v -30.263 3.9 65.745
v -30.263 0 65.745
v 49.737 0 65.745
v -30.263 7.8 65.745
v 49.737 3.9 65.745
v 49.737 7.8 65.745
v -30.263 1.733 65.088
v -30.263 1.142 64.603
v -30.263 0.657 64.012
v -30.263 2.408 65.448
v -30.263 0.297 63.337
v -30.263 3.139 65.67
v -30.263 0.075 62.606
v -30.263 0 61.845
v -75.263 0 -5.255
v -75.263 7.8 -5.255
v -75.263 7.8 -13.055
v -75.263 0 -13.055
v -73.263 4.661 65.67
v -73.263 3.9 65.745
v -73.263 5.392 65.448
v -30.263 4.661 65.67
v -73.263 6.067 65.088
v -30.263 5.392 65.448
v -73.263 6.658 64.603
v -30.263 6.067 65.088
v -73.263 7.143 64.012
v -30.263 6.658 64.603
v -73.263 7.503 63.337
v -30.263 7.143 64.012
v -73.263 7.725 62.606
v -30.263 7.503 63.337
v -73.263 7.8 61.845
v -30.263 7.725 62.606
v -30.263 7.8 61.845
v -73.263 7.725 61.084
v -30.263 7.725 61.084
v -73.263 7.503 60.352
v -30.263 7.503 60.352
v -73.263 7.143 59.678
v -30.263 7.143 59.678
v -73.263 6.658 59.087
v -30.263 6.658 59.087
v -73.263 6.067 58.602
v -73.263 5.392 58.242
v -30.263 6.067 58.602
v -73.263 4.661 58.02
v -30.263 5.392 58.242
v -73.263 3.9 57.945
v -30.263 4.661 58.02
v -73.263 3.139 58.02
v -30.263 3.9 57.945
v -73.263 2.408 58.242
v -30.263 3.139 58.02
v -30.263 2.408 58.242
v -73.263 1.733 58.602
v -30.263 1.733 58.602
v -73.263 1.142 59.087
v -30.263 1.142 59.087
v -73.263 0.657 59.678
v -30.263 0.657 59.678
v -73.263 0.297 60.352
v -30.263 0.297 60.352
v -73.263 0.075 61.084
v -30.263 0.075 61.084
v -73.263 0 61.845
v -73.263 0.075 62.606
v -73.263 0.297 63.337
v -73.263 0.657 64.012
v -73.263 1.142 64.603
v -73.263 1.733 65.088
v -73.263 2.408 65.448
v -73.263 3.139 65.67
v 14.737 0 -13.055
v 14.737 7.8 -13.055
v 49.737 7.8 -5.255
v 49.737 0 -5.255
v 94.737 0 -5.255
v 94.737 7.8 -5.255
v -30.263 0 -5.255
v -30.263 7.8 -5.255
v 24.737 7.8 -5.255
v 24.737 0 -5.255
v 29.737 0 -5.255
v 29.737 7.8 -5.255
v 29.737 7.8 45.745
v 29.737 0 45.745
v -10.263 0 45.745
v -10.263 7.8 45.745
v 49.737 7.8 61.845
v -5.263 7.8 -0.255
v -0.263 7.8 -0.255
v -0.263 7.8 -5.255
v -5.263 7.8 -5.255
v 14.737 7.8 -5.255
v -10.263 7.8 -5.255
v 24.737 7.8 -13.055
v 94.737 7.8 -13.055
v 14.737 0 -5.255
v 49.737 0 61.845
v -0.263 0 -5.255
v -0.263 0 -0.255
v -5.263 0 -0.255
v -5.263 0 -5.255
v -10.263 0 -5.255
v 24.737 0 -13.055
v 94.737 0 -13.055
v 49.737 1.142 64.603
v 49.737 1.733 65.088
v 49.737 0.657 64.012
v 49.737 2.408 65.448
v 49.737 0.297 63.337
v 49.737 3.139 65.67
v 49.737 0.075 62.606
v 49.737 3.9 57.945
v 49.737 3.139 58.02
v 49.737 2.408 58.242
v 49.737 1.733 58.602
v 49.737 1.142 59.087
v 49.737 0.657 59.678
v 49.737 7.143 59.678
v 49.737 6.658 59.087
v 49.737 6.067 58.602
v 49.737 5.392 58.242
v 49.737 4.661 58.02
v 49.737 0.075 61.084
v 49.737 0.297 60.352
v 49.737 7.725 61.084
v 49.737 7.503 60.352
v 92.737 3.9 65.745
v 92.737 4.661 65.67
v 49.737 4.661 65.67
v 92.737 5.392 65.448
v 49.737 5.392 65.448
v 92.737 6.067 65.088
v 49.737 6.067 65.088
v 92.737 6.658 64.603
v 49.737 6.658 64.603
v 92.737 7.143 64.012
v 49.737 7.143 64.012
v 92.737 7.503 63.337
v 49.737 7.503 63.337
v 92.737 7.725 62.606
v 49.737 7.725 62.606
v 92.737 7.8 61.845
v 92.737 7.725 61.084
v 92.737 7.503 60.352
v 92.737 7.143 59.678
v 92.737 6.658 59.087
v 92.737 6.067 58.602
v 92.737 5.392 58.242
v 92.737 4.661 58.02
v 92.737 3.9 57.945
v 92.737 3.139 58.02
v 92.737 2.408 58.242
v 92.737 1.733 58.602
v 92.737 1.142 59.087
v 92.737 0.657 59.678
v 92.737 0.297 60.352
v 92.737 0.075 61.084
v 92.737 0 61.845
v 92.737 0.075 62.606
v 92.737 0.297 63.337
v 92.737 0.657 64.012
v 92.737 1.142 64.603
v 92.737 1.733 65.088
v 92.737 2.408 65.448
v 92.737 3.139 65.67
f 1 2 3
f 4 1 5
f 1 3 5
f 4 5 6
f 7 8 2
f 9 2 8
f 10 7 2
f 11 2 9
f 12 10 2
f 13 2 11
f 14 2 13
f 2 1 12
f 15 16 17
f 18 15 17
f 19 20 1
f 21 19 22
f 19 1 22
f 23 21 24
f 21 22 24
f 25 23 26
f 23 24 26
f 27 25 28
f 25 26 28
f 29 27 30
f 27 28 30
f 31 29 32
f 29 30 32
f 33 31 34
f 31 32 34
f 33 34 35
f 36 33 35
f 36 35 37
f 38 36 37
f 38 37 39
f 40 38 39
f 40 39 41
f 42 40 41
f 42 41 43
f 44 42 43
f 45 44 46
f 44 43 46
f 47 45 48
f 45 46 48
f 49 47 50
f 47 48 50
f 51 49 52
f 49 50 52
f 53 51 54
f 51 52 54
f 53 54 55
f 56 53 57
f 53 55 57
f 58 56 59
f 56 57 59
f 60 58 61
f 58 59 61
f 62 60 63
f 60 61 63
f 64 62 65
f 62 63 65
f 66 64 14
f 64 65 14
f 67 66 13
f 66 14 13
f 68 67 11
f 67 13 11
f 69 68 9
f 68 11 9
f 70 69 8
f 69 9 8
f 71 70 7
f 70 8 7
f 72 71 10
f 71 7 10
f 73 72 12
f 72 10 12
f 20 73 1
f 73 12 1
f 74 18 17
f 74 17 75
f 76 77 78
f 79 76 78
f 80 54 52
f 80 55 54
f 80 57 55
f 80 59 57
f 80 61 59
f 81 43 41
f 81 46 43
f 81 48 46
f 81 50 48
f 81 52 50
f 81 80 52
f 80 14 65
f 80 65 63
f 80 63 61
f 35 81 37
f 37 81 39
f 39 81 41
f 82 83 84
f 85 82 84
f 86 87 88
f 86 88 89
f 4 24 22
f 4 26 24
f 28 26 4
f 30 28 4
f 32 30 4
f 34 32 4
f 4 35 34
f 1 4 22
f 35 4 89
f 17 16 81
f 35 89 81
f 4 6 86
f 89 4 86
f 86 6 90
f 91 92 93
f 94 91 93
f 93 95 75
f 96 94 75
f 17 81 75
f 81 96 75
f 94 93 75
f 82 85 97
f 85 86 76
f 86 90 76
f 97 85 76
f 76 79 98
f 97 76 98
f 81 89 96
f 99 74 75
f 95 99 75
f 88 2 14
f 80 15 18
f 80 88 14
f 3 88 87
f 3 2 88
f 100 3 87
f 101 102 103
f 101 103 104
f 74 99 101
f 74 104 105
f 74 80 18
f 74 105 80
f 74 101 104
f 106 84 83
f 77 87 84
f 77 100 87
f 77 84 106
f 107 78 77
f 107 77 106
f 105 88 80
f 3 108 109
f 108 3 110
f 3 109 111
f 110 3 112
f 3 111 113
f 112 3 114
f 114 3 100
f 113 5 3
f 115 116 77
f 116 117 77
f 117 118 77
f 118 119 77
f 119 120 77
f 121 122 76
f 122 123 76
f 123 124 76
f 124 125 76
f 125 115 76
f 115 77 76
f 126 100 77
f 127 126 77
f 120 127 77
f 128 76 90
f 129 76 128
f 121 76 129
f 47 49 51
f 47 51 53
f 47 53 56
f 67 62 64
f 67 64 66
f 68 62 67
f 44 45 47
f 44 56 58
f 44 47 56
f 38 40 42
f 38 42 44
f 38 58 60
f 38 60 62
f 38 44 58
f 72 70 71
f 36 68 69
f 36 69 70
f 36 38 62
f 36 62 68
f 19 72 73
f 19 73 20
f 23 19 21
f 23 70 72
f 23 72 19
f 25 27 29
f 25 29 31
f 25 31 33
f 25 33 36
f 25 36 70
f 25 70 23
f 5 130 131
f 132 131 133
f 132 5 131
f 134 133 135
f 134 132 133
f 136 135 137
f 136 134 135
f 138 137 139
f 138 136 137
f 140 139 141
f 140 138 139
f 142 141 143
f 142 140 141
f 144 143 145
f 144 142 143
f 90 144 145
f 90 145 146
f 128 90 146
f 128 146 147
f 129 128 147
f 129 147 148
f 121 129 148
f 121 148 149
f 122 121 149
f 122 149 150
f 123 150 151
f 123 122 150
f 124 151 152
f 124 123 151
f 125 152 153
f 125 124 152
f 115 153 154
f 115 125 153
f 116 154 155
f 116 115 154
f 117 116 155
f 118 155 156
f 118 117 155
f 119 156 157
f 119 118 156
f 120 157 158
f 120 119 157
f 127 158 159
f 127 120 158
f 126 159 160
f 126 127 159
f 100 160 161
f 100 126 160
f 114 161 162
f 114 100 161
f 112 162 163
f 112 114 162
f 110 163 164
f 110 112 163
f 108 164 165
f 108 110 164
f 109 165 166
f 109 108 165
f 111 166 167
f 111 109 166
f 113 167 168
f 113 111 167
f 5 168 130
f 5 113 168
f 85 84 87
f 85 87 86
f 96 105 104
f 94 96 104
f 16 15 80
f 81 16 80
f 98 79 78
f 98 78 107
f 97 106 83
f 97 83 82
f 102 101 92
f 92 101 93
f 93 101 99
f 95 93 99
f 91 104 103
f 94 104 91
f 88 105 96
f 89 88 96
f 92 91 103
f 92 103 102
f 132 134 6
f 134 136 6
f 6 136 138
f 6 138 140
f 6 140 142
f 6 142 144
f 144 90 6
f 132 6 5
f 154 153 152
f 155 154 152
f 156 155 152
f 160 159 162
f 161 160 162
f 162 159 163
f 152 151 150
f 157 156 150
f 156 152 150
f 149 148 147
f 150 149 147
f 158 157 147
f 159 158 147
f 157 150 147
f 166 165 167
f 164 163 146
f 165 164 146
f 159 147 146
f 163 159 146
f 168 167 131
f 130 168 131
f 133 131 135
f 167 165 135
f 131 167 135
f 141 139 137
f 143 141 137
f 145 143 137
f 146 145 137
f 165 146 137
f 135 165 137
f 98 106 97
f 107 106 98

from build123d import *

# Parameters (mm, degrees)
SKETCH1_W           = 170
SKETCH1_H           = 7.8
BOSS_EXTRUDE1_DEPTH = 7.8
SKETCH2_W           = 20
SKETCH2_H           = 7.8
BOSS_EXTRUDE2_DEPTH = 71
SKETCH3_R           = 3.9
BOSS_EXTRUDE3_DEPTH = 43
SKETCH4_W           = 20
SKETCH4_H           = 7.8
BOSS_EXTRUDE4_DEPTH = 25
SKETCH5_W           = 10
SKETCH5_H           = 7.8
CUT_EXTRUDE1_DEPTH  = 119.646151442
SKETCH6_W           = 5
SKETCH6_H           = 7.8
BOSS_EXTRUDE5_DEPTH = 5


with BuildPart() as part:
    # Sketch1 → Boss-Extrude1 (new body)
    with BuildSketch(Plane(origin=(0, 0, 0), x_dir=(1, 0, 0), z_dir=(0, 1, 0))):
        with Locations((9.736842105, 9.155198973)):
            Rectangle(SKETCH1_W, SKETCH1_H)
    extrude(amount=BOSS_EXTRUDE1_DEPTH)

    # Sketch2 → Boss-Extrude2 (add)
    with BuildSketch(Plane.XY.offset(-5.255198973)):
        with Locations((-20.263157895, 3.9)):
            Rectangle(SKETCH2_W, SKETCH2_H)
    boss_extrude2 = extrude(amount=BOSS_EXTRUDE2_DEPTH)

    # Sketch3 → Boss-Extrude3 (add)
    with BuildSketch(Plane.ZY.offset(30.263157895)):
        with Locations((61.844801027, 3.9)):
            Circle(SKETCH3_R)
    boss_extrude3 = extrude(amount=BOSS_EXTRUDE3_DEPTH)

    # Sketch4 → Boss-Extrude4 (add)
    with BuildSketch(Plane(origin=(-10.263157895, 0, 0), x_dir=(0, 0, -1), z_dir=(1, 0, 0))):
        with Locations((-55.744801027, 3.9)):
            Rectangle(SKETCH4_W, SKETCH4_H)
    boss_extrude4 = extrude(amount=BOSS_EXTRUDE4_DEPTH)

    # Mirror1: Boss-Extrude2, Boss-Extrude3, Boss-Extrude4 across plane
    add(boss_extrude2.mirror(Plane.ZY.offset(-9.736842105)))
    add(boss_extrude3.mirror(Plane.ZY.offset(-9.736842105)))
    add(boss_extrude4.mirror(Plane.ZY.offset(-9.736842105)))

    # Sketch5 → Cut-Extrude1 (cut, through all)
    with BuildSketch(Plane.XY.offset(-5.255198973)):
        with Locations((19.736842105, 3.9)):
            Rectangle(SKETCH5_W, SKETCH5_H)
    extrude(amount=-CUT_EXTRUDE1_DEPTH, mode=Mode.SUBTRACT)

    # Sketch6 → Boss-Extrude5 (add)
    with BuildSketch(Plane.XY.offset(-5.255198973)):
        with Locations((-2.763157895, 3.9)):
            Rectangle(SKETCH6_W, SKETCH6_H)
    extrude(amount=BOSS_EXTRUDE5_DEPTH)


solid = part.part
